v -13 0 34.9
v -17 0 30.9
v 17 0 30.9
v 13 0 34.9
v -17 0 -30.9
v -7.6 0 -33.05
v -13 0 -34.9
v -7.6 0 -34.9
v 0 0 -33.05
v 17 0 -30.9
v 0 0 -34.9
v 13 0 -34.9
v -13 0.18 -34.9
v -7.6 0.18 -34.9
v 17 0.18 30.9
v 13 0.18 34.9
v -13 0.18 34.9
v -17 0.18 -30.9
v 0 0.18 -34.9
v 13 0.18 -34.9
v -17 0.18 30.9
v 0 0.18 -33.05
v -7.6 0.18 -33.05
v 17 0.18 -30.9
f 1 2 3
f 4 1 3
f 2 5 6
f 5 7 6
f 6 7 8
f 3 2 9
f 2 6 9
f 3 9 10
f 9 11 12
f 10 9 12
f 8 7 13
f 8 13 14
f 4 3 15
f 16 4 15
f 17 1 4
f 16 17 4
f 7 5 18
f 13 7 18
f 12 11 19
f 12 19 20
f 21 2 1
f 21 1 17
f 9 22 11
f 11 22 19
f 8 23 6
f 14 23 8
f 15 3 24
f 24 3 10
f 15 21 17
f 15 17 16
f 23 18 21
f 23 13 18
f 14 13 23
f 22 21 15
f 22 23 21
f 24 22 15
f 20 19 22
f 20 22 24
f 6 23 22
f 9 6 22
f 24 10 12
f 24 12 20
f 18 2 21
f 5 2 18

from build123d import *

# Parameters (mm, degrees)
SKETCH1_W           = 34
SKETCH1_H           = 69.8
BOSS_EXTRUDE1_DEPTH = 0.18
CHAMFER1_SIZE       = 4
SKETCH2_W           = 7.6
SKETCH2_H           = 1.85
CUT_EXTRUDE1_DEPTH  = 1.18


with BuildPart() as part:
    # Sketch1 → Boss-Extrude1 (new body)
    with BuildSketch(Plane(origin=(0, 0, 0), x_dir=(1, 0, 0), z_dir=(0, 1, 0))):
        Rectangle(SKETCH1_W, SKETCH1_H)
    extrude(amount=BOSS_EXTRUDE1_DEPTH)

    # Chamfer1
    chamfer1_edges = [part.edges().sort_by_distance(p)[0] for p in [
        (17, 0.09, 34.9),
        (-17, 0.09, 34.9),
        (-17, 0.09, -34.9),
        (17, 0.09, -34.9),
    ]]
    chamfer(chamfer1_edges, length=CHAMFER1_SIZE)

    # Sketch2 → Cut-Extrude1 (cut, through all)
    with BuildSketch(Plane(origin=(0, 0.18, 0), x_dir=(1, 0, 0), z_dir=(0, 1, 0))):
        with Locations((-3.8, 33.975)):
            Rectangle(SKETCH2_W, SKETCH2_H)
    extrude(amount=-CUT_EXTRUDE1_DEPTH, mode=Mode.SUBTRACT)


solid = part.part
